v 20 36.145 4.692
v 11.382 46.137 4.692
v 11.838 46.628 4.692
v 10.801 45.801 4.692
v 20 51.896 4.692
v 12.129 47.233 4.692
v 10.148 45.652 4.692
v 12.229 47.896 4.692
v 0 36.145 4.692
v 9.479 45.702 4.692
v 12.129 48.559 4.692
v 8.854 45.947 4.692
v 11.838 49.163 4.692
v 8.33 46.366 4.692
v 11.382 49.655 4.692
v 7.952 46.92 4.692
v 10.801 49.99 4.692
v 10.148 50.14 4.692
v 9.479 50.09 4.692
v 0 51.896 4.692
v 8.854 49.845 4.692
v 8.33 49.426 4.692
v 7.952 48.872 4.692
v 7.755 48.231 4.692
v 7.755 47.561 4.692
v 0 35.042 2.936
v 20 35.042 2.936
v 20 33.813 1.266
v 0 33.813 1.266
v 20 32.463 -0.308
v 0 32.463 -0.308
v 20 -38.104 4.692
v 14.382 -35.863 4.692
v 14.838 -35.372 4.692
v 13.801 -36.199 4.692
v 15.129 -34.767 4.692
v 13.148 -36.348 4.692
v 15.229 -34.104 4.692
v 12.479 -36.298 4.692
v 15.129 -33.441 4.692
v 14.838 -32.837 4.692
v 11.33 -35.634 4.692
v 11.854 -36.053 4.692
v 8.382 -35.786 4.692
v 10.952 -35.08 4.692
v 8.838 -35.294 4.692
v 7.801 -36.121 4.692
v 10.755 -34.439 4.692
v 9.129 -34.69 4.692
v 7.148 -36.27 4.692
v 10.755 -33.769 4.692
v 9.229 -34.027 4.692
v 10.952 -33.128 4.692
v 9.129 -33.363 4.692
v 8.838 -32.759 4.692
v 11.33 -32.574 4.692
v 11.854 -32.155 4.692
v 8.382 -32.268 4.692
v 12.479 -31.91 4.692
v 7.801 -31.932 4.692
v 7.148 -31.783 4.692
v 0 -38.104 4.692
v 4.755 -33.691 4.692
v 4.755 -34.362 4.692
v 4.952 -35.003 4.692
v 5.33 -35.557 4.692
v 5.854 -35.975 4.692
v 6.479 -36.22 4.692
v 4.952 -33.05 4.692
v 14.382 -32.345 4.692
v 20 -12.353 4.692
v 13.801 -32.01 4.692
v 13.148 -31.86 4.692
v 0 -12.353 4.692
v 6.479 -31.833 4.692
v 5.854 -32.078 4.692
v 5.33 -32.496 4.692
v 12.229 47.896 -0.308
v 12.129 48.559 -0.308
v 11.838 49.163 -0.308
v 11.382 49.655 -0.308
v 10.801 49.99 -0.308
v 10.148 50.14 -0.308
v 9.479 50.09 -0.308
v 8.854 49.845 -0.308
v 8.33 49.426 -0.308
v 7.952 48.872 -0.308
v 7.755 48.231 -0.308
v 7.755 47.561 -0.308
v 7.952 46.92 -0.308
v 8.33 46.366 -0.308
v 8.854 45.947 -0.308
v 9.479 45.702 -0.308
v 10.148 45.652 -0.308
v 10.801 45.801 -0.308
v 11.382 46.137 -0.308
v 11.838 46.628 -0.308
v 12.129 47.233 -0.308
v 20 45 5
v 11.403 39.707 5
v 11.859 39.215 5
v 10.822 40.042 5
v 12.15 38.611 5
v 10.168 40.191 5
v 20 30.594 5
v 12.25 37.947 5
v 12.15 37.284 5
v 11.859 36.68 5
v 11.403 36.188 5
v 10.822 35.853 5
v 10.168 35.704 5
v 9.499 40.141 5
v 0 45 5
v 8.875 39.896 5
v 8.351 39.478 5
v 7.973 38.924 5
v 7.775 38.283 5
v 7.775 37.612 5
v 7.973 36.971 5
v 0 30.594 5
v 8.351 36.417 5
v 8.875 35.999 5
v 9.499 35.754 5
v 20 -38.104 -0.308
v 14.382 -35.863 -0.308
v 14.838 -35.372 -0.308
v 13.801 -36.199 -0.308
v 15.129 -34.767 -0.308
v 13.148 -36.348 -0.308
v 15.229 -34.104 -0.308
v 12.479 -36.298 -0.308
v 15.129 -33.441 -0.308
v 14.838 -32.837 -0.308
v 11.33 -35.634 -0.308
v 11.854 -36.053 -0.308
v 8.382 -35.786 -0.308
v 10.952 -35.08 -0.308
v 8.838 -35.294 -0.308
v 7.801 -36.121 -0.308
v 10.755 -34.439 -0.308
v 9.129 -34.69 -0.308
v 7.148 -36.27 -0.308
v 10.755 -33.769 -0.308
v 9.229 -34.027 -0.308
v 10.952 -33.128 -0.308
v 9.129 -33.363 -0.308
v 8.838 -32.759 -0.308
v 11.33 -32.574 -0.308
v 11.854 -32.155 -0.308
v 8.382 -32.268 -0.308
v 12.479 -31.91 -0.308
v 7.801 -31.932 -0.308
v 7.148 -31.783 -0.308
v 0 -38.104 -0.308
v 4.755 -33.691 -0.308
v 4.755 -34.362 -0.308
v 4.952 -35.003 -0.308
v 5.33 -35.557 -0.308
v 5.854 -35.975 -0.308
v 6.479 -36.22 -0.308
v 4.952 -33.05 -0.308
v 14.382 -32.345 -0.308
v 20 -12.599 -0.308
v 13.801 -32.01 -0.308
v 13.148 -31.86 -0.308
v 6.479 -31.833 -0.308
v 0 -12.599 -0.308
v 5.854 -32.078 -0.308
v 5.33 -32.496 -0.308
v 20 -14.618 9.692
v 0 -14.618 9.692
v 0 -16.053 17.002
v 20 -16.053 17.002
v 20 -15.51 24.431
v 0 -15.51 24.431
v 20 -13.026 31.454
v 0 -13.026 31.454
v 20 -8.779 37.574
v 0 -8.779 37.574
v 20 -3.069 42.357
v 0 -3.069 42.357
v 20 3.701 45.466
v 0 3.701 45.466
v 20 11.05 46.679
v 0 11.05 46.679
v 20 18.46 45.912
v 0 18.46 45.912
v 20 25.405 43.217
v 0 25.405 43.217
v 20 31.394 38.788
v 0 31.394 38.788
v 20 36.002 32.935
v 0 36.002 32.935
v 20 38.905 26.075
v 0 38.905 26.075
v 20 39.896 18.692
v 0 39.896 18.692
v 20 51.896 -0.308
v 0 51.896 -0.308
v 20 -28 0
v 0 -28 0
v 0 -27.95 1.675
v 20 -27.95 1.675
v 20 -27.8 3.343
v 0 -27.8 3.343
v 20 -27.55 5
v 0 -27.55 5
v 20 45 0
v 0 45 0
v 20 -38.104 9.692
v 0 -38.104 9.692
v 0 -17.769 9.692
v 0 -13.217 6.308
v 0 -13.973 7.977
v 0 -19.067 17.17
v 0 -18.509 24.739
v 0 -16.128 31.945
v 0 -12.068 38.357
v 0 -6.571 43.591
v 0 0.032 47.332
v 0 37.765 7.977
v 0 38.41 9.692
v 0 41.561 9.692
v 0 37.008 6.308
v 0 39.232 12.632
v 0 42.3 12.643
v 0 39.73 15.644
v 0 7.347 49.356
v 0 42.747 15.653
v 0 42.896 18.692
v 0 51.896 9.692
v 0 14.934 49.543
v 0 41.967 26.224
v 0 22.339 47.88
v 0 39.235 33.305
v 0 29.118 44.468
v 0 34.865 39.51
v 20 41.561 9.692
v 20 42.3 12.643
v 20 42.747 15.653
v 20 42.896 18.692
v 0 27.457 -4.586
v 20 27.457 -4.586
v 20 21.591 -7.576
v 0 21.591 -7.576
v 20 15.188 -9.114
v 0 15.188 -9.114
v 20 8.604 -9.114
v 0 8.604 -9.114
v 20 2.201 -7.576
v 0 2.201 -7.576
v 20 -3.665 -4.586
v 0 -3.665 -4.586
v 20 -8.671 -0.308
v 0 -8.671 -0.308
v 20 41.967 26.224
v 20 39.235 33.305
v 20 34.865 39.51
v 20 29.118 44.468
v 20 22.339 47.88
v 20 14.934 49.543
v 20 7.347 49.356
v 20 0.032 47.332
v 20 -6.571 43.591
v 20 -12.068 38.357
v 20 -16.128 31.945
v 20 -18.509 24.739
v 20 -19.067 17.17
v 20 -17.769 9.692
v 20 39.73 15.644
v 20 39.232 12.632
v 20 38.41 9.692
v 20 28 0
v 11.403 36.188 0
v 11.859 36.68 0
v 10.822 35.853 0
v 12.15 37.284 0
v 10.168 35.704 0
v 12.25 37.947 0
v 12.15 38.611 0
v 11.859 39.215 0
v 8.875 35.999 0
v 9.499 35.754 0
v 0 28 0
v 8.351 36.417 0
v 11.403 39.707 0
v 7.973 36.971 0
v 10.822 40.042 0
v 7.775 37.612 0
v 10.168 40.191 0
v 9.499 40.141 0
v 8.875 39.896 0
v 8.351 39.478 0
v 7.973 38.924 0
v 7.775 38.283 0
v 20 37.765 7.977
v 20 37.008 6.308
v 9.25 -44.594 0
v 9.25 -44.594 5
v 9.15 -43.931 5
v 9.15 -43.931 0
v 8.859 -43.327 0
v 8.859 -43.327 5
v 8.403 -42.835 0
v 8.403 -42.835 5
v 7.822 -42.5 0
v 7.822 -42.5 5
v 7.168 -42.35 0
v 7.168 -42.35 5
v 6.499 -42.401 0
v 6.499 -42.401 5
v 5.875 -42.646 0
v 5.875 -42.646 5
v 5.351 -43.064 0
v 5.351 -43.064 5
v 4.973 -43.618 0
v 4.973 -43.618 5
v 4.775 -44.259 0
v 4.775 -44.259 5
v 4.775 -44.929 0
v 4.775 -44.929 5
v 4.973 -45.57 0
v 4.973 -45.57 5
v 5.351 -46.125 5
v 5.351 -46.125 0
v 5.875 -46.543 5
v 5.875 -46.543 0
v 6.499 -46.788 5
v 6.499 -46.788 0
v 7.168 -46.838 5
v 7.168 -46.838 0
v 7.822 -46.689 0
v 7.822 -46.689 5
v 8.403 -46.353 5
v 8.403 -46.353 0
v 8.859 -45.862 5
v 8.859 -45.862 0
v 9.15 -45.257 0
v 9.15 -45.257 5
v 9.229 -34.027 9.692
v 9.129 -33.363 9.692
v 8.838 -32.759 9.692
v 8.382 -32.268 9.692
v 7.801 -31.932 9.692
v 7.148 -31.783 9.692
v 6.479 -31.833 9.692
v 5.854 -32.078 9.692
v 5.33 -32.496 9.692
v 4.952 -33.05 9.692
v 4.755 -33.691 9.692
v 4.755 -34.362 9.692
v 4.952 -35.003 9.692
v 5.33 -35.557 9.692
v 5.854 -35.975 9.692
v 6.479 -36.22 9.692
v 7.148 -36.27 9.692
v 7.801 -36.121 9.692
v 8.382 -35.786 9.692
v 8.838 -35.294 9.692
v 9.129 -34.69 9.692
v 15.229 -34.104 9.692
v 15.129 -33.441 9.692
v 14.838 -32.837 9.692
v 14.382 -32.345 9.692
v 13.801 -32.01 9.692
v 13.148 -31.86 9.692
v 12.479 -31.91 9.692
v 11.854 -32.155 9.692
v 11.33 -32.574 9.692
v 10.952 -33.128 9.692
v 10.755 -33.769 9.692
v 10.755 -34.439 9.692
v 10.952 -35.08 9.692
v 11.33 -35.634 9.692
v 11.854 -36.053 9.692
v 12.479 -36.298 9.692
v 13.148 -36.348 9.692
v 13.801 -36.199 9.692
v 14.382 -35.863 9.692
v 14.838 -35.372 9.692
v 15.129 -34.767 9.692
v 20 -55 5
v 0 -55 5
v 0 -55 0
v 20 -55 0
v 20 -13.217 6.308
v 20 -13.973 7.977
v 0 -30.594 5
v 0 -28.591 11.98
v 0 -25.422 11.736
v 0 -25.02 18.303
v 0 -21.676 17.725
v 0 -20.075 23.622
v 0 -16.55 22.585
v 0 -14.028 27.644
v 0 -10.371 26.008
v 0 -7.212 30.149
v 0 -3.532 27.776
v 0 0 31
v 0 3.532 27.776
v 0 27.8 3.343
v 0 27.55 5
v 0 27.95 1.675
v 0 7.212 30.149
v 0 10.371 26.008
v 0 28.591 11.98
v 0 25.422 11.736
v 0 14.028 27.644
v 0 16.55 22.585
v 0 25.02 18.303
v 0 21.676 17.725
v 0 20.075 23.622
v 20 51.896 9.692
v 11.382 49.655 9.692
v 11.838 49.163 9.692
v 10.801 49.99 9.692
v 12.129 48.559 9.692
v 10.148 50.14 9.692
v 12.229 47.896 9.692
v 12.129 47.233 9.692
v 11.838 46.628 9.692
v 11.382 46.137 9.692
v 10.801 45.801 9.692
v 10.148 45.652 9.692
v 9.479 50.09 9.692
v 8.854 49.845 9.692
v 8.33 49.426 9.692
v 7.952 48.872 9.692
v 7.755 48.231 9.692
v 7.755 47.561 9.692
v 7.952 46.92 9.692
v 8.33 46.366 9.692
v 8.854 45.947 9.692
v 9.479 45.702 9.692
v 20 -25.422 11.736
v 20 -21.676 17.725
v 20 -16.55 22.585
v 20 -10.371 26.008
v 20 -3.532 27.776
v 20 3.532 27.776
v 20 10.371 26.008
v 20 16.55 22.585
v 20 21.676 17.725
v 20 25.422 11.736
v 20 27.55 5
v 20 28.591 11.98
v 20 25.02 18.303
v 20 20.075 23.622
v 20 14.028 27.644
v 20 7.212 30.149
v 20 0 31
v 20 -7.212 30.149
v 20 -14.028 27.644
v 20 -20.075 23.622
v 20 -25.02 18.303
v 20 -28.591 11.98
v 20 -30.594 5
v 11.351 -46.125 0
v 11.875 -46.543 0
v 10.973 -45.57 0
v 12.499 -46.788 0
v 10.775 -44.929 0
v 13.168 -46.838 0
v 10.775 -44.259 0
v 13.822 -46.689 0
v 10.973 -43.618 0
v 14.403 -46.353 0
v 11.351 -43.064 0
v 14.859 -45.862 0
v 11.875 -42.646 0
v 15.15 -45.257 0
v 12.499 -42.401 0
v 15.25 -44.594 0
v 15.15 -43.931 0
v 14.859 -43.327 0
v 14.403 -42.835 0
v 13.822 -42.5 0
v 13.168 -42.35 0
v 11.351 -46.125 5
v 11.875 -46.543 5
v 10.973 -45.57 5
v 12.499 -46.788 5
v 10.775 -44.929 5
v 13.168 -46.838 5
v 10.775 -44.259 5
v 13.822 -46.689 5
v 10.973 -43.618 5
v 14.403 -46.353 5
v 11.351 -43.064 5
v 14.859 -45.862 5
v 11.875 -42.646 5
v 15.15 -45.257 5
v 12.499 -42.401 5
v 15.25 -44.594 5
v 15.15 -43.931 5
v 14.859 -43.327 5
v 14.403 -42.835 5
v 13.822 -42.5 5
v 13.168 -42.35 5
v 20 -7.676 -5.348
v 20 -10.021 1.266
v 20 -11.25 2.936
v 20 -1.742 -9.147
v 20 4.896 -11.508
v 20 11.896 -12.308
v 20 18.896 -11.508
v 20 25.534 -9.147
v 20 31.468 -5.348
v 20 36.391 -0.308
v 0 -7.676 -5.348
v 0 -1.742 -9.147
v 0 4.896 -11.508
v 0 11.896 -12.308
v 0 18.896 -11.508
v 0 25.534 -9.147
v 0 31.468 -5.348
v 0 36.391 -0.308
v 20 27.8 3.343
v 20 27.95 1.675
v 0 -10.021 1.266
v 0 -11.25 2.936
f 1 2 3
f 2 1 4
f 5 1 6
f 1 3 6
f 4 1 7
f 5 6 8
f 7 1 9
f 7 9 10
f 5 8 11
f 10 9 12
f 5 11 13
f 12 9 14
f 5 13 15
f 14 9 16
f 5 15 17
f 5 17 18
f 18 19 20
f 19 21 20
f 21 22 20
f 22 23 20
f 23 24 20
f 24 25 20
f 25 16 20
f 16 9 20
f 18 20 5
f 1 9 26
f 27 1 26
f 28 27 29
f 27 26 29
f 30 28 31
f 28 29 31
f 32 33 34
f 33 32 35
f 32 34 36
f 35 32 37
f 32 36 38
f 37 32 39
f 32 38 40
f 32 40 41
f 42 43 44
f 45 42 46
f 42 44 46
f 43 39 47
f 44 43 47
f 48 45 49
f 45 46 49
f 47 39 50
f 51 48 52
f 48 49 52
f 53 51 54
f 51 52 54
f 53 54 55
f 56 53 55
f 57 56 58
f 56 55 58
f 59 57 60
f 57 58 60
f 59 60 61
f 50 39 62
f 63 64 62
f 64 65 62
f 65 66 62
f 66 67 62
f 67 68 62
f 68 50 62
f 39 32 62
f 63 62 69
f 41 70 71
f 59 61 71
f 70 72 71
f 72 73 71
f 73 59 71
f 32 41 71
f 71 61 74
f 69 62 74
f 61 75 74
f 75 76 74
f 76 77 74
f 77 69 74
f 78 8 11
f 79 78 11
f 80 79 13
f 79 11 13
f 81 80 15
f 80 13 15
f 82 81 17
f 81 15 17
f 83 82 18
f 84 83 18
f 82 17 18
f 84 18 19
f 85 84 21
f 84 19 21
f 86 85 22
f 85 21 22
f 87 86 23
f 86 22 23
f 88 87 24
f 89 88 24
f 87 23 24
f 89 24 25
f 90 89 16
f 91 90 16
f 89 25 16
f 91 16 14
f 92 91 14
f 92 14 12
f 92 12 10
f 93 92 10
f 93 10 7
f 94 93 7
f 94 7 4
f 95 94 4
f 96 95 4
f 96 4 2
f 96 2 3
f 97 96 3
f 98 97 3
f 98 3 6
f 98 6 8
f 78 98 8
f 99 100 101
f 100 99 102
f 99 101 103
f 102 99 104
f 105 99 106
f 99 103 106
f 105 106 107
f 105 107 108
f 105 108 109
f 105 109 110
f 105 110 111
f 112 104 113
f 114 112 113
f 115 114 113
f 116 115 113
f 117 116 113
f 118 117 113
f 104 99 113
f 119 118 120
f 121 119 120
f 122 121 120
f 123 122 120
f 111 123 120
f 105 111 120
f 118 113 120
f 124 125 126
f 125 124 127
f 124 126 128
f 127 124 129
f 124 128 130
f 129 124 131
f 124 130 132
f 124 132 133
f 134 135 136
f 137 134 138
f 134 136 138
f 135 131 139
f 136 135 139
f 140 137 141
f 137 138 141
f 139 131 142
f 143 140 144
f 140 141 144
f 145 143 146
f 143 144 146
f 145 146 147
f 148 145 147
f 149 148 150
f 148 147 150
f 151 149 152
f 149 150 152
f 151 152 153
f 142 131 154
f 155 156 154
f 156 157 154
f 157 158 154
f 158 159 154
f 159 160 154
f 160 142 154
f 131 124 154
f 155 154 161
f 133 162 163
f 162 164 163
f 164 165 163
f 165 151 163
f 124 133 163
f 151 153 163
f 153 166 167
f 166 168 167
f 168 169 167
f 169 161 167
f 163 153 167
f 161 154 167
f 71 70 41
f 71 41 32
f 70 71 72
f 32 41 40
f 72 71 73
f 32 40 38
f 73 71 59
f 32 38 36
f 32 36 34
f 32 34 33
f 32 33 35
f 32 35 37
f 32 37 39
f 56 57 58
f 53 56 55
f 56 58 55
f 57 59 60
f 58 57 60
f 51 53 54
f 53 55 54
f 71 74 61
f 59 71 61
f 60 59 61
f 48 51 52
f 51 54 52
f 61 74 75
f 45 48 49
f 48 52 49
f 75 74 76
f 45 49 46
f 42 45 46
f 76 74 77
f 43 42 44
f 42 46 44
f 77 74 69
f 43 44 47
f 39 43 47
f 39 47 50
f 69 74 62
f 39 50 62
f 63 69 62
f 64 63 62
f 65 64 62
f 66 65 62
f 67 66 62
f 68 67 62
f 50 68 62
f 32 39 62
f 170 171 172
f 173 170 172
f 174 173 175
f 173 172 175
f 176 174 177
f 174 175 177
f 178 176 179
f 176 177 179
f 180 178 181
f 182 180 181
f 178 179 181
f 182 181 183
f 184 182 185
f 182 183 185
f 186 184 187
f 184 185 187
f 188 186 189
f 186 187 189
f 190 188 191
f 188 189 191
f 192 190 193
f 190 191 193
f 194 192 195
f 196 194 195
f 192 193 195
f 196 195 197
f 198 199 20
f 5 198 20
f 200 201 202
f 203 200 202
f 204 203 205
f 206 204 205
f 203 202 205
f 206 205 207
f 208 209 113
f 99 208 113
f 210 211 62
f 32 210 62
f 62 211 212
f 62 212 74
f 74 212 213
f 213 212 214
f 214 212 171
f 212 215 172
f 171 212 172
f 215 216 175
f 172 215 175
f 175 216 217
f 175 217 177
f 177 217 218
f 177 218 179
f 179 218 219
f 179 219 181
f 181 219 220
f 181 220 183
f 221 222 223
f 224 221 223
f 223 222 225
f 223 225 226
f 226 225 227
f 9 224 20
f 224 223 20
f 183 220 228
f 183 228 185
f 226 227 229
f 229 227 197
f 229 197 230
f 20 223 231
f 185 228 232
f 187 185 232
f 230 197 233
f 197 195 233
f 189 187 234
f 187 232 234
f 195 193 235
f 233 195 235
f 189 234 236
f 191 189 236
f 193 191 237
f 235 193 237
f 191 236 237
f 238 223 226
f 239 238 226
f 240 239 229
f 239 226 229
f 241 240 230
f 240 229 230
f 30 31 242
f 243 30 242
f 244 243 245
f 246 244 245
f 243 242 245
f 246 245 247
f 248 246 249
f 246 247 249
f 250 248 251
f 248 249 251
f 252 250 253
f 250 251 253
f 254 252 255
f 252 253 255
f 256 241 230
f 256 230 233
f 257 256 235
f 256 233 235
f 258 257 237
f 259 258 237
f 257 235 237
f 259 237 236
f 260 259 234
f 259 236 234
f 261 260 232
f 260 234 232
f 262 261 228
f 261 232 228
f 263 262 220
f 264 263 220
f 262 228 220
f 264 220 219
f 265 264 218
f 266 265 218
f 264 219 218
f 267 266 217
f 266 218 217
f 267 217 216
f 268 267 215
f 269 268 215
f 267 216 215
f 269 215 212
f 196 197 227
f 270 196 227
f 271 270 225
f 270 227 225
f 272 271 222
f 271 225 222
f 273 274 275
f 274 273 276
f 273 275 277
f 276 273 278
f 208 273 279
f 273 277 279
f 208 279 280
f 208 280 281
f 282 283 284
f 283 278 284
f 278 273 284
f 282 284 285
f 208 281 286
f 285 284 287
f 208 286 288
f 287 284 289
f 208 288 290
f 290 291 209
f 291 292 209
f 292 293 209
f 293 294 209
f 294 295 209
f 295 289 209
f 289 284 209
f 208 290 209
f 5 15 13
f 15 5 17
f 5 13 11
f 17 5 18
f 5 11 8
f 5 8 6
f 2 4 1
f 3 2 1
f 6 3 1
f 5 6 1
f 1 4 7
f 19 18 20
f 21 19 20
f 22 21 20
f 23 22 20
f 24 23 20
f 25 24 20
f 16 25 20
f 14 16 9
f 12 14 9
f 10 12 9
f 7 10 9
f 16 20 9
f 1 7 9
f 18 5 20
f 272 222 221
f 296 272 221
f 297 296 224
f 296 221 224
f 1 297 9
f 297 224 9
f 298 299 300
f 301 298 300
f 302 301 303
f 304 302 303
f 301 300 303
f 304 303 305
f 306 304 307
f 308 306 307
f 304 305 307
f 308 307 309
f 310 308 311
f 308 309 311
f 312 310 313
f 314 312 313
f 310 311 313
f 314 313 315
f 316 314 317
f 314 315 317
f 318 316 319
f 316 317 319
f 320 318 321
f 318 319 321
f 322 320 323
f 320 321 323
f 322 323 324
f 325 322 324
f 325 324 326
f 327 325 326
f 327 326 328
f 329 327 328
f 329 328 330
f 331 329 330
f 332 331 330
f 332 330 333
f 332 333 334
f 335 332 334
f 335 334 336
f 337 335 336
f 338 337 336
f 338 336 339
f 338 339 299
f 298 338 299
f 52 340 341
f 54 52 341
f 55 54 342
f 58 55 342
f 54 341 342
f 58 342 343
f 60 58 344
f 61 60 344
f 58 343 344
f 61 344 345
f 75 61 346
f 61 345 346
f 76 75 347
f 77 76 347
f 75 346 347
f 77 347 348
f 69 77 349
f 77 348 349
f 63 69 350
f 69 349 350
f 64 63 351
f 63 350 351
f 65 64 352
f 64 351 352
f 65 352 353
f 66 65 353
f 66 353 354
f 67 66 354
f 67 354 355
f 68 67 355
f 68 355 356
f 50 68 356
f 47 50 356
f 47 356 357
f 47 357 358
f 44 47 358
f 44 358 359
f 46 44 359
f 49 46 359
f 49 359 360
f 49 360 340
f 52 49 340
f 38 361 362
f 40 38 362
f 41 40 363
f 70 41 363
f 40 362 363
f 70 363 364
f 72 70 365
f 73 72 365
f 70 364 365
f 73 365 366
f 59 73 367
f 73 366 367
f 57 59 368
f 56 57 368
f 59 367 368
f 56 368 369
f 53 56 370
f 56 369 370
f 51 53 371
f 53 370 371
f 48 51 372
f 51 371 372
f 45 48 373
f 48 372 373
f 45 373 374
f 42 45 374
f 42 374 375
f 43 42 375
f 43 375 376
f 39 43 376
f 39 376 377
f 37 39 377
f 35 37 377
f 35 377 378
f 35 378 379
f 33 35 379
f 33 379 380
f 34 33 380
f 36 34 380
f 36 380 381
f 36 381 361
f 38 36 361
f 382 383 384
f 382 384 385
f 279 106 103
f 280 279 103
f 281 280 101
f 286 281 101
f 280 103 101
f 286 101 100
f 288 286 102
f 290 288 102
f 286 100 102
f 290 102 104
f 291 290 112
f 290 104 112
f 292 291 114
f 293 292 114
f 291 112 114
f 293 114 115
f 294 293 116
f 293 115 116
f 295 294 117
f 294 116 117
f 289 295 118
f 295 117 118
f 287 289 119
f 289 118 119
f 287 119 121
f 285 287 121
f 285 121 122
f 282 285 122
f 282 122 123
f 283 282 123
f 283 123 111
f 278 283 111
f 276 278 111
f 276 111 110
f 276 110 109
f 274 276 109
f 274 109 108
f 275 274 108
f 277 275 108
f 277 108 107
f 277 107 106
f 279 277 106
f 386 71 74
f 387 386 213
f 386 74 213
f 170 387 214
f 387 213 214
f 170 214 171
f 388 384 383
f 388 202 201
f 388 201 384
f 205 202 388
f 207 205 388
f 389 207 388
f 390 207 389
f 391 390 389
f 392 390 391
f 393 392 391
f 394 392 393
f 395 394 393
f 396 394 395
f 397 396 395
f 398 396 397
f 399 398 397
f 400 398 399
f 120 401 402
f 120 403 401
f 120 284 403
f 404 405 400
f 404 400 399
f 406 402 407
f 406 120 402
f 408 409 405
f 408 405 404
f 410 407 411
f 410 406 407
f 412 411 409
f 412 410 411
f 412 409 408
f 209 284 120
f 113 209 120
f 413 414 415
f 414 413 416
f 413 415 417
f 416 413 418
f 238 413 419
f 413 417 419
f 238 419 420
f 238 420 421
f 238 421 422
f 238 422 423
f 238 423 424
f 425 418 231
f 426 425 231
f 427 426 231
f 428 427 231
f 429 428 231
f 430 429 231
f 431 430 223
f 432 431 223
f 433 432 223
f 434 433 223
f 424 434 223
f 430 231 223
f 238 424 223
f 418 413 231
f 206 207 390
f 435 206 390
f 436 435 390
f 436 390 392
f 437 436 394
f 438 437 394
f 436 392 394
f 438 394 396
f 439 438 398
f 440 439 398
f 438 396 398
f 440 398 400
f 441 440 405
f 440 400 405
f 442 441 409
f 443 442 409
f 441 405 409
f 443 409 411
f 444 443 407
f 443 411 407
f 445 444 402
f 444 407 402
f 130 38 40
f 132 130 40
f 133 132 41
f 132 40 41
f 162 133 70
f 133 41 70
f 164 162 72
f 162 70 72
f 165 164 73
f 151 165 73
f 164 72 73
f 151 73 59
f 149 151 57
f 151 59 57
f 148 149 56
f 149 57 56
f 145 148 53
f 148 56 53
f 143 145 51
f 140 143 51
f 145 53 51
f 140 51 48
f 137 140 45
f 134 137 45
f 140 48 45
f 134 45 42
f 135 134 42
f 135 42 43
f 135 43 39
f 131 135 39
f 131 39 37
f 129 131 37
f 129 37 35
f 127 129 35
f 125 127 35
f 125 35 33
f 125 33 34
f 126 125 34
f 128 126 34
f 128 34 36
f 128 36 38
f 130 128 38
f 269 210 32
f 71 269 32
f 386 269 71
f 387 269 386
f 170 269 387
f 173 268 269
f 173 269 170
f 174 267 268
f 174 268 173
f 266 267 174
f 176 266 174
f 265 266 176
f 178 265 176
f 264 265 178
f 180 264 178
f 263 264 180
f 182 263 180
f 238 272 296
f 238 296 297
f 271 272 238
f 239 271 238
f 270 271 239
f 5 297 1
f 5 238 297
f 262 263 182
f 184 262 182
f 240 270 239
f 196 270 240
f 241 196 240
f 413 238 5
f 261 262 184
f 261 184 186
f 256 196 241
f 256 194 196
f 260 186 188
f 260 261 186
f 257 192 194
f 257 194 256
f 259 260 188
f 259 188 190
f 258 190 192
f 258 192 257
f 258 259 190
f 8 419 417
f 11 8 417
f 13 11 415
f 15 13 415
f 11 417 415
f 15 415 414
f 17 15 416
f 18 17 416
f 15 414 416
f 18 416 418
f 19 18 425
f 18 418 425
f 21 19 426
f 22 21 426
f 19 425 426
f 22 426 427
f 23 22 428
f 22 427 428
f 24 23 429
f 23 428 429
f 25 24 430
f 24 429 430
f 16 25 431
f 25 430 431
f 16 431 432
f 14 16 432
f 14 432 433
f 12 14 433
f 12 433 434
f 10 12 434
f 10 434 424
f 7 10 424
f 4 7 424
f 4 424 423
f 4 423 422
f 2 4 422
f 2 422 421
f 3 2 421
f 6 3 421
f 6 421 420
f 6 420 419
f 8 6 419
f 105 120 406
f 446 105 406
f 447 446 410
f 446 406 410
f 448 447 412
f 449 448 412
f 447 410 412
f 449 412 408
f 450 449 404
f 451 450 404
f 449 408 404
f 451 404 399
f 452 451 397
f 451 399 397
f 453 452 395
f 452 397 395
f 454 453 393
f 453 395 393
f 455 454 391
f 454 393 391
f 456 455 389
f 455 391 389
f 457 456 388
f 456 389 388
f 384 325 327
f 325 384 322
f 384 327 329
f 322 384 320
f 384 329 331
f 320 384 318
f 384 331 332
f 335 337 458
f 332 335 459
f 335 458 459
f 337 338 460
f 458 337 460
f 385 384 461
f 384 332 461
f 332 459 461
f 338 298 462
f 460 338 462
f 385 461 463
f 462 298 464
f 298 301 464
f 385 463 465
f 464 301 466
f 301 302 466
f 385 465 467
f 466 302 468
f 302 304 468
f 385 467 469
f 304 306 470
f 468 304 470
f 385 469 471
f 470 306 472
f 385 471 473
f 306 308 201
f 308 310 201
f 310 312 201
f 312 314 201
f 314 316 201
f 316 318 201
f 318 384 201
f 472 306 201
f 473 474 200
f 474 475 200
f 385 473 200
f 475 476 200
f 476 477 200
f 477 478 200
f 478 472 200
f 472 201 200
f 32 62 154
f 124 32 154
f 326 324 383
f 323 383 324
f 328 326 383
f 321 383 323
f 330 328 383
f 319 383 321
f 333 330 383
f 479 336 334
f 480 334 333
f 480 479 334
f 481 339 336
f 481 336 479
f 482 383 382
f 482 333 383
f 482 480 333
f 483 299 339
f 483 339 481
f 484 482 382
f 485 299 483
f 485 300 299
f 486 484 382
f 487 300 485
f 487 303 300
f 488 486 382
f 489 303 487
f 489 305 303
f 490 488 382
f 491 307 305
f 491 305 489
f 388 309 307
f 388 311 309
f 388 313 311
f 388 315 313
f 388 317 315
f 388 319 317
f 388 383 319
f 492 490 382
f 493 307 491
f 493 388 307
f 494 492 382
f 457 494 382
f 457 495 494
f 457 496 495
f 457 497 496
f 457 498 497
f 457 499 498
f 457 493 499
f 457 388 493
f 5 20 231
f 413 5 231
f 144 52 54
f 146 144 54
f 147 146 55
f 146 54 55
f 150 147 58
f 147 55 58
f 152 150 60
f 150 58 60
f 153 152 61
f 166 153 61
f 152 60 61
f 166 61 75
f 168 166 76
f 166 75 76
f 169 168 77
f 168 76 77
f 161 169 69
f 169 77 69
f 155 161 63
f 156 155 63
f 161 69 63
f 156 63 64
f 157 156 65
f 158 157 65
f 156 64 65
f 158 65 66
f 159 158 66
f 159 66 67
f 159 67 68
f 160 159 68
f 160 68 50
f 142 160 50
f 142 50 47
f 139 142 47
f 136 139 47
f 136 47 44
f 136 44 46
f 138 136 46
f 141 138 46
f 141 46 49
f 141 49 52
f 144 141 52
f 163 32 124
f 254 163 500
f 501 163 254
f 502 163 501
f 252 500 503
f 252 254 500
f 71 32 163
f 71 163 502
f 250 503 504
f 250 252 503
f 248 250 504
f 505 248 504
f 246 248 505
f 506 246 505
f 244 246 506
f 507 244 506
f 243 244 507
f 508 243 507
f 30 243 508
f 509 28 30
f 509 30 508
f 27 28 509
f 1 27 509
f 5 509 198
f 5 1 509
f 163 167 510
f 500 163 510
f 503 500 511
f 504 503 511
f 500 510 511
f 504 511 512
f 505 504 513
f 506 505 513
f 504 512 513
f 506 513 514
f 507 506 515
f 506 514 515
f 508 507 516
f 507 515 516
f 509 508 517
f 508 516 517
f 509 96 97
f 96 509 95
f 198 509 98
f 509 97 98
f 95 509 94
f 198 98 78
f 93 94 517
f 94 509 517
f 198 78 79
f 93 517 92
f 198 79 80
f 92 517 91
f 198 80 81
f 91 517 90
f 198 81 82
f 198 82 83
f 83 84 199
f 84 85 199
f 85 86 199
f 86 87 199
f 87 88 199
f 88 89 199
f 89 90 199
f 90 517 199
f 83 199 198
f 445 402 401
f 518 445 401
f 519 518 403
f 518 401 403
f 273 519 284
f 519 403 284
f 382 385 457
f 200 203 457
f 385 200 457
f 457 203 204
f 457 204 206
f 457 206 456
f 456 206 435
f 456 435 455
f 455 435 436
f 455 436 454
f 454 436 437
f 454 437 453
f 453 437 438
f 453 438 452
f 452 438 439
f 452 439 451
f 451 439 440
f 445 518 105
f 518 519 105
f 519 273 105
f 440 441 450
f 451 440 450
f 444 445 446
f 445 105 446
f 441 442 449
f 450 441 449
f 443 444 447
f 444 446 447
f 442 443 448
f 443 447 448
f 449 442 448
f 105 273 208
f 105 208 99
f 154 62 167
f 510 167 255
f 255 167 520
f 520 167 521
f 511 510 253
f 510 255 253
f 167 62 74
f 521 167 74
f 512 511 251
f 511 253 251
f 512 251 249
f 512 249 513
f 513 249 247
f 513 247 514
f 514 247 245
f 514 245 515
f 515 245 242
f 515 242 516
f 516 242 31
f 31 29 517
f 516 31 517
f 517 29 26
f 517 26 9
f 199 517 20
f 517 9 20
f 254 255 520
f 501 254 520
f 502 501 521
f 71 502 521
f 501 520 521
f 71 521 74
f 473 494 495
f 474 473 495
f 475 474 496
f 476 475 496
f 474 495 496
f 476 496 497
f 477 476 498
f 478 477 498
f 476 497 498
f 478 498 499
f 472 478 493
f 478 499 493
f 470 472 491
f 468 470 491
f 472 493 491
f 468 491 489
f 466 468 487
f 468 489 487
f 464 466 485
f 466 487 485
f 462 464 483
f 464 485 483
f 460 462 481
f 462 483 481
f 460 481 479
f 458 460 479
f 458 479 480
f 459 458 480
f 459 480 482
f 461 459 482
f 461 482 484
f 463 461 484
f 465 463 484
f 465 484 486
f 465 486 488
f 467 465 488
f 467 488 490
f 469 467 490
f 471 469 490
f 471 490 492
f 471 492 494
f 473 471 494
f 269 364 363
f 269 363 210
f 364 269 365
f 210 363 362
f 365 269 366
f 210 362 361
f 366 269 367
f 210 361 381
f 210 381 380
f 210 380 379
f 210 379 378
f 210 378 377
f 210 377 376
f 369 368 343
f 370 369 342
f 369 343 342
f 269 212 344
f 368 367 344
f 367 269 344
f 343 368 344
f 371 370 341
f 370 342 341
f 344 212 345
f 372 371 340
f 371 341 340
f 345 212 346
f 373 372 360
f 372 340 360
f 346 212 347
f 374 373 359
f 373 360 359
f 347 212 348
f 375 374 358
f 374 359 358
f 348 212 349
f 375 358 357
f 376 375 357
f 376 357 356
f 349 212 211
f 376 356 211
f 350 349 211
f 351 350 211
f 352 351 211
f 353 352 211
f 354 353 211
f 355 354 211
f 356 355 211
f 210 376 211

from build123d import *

# Parameters (mm, degrees)
BOSS_EXTRUDE1_DEPTH = 20
SKETCH3_W           = 20
SKETCH3_H           = 5
BOSS_EXTRUDE2_DEPTH = 10
SKETCH2_R           = 2.25
CUT_EXTRUDE1_DEPTH  = 10
BOSS_EXTRUDE3_DEPTH = 20
BOSS_EXTRUDE4_DEPTH = 20
SKETCH5_R           = 2.25
CUT_EXTRUDE2_DEPTH  = 20


with BuildPart() as part:
    # Sketch1 → Boss-Extrude1 (new body)
    with BuildSketch(Plane.YZ):
        with BuildLine():
            ThreePointArc((-28, 0), (0, 28), (28, 0))
            Line((28, 0), (45, 0))
            Line((45, 0), (45, 5))
            Line((45, 5), (30.594117082, 5))
            ThreePointArc((30.594117082, 5), (0, 31), (-30.594117082, 5))
            Line((-30.594117082, 5), (-45, 5))
            Line((-45, 5), (-45, 0))
            Line((-45, 0), (-28, 0))
        make_face()
    extrude(amount=BOSS_EXTRUDE1_DEPTH)

    # Sketch3 → Boss-Extrude2 (add)
    with BuildSketch(Plane.XZ.offset(45)):
        with Locations((10, 2.5)):
            Rectangle(SKETCH3_W, SKETCH3_H)
    extrude(amount=BOSS_EXTRUDE2_DEPTH)

    # Sketch2 → Cut-Extrude1 (cut)
    with BuildSketch(Plane.XY.offset(5)):
        with Locations((7, -44.594117082)):
            Circle(SKETCH2_R)
        with Locations((10, 37.947426475)):
            Circle(SKETCH2_R)
        with Locations((13, -44.594117082)):
            Circle(SKETCH2_R)
    extrude(amount=-CUT_EXTRUDE1_DEPTH, mode=Mode.SUBTRACT)


with BuildPart() as body_2:
    # Sketch4 → Boss-Extrude3 (new body)
    with BuildSketch(Plane.YZ):
        with BuildLine():
            Line((51.89594566, 4.691811125), (51.89594566, 9.691811125))
            Line((51.89594566, 9.691811125), (41.560739608, 9.691811125))
            ThreePointArc((41.560739608, 9.691811125), (11.89594566, 49.691811125), (-17.768848289, 9.691811125))
            Line((-17.768848289, 9.691811125), (-38.10405434, 9.691811125))
            Line((-38.10405434, 9.691811125), (-38.10405434, 4.691811125))
            Line((-38.10405434, 4.691811125), (-12.352765646, 4.691811125))
            ThreePointArc((-12.352765646, 4.691811125), (11.89594566, 46.691811125), (36.144656966, 4.691811125))
            Line((36.144656966, 4.691811125), (51.89594566, 4.691811125))
        make_face()
    extrude(amount=BOSS_EXTRUDE3_DEPTH)


with BuildPart() as body_3:
    # Sketch4<3> → Boss-Extrude4 (new body)
    with BuildSketch(Plane.YZ):
        with BuildLine():
            Line((51.89594566, -0.308188875), (51.89594566, 4.691811125))
            Line((51.89594566, 4.691811125), (36.144656966, 4.691811125))
            ThreePointArc((36.144656966, 4.691811125), (11.89594566, -9.308188875), (-12.352765646, 4.691811125))
            Line((-12.352765646, 4.691811125), (-38.10405434, 4.691811125))
            Line((-38.10405434, 4.691811125), (-38.10405434, -0.308188875))
            Line((-38.10405434, -0.308188875), (-12.598951768, -0.308188875))
            ThreePointArc((-12.598951768, -0.308188875), (11.89594566, -12.308188875), (36.390843088, -0.308188875))
            Line((36.390843088, -0.308188875), (51.89594566, -0.308188875))
        make_face()
    extrude(amount=BOSS_EXTRUDE4_DEPTH)


with BuildPart() as cut_extrude2_tool:
    # Sketch5 → Cut-Extrude2 (new body)
    with BuildSketch(Plane.XY.offset(9.691811125)):
        with Locations((6.979433218, -34.02668172)):
            Circle(SKETCH5_R)
        with Locations((9.979433218, 47.89594566)):
            Circle(SKETCH5_R)
        with Locations((12.979433218, -34.10405434)):
            Circle(SKETCH5_R)
    extrude(amount=-CUT_EXTRUDE2_DEPTH)


with BuildPart() as body_2_1:
    add(body_2.part)

    # Cut-Extrude2: cut by cut_extrude2_tool
    add(cut_extrude2_tool.part, mode=Mode.SUBTRACT)


with BuildPart() as body_3_1:
    add(body_3.part)

    # Cut-Extrude2: cut by cut_extrude2_tool
    add(cut_extrude2_tool.part, mode=Mode.SUBTRACT)


solid = Compound([part.part, body_2_1.part, body_3_1.part])
